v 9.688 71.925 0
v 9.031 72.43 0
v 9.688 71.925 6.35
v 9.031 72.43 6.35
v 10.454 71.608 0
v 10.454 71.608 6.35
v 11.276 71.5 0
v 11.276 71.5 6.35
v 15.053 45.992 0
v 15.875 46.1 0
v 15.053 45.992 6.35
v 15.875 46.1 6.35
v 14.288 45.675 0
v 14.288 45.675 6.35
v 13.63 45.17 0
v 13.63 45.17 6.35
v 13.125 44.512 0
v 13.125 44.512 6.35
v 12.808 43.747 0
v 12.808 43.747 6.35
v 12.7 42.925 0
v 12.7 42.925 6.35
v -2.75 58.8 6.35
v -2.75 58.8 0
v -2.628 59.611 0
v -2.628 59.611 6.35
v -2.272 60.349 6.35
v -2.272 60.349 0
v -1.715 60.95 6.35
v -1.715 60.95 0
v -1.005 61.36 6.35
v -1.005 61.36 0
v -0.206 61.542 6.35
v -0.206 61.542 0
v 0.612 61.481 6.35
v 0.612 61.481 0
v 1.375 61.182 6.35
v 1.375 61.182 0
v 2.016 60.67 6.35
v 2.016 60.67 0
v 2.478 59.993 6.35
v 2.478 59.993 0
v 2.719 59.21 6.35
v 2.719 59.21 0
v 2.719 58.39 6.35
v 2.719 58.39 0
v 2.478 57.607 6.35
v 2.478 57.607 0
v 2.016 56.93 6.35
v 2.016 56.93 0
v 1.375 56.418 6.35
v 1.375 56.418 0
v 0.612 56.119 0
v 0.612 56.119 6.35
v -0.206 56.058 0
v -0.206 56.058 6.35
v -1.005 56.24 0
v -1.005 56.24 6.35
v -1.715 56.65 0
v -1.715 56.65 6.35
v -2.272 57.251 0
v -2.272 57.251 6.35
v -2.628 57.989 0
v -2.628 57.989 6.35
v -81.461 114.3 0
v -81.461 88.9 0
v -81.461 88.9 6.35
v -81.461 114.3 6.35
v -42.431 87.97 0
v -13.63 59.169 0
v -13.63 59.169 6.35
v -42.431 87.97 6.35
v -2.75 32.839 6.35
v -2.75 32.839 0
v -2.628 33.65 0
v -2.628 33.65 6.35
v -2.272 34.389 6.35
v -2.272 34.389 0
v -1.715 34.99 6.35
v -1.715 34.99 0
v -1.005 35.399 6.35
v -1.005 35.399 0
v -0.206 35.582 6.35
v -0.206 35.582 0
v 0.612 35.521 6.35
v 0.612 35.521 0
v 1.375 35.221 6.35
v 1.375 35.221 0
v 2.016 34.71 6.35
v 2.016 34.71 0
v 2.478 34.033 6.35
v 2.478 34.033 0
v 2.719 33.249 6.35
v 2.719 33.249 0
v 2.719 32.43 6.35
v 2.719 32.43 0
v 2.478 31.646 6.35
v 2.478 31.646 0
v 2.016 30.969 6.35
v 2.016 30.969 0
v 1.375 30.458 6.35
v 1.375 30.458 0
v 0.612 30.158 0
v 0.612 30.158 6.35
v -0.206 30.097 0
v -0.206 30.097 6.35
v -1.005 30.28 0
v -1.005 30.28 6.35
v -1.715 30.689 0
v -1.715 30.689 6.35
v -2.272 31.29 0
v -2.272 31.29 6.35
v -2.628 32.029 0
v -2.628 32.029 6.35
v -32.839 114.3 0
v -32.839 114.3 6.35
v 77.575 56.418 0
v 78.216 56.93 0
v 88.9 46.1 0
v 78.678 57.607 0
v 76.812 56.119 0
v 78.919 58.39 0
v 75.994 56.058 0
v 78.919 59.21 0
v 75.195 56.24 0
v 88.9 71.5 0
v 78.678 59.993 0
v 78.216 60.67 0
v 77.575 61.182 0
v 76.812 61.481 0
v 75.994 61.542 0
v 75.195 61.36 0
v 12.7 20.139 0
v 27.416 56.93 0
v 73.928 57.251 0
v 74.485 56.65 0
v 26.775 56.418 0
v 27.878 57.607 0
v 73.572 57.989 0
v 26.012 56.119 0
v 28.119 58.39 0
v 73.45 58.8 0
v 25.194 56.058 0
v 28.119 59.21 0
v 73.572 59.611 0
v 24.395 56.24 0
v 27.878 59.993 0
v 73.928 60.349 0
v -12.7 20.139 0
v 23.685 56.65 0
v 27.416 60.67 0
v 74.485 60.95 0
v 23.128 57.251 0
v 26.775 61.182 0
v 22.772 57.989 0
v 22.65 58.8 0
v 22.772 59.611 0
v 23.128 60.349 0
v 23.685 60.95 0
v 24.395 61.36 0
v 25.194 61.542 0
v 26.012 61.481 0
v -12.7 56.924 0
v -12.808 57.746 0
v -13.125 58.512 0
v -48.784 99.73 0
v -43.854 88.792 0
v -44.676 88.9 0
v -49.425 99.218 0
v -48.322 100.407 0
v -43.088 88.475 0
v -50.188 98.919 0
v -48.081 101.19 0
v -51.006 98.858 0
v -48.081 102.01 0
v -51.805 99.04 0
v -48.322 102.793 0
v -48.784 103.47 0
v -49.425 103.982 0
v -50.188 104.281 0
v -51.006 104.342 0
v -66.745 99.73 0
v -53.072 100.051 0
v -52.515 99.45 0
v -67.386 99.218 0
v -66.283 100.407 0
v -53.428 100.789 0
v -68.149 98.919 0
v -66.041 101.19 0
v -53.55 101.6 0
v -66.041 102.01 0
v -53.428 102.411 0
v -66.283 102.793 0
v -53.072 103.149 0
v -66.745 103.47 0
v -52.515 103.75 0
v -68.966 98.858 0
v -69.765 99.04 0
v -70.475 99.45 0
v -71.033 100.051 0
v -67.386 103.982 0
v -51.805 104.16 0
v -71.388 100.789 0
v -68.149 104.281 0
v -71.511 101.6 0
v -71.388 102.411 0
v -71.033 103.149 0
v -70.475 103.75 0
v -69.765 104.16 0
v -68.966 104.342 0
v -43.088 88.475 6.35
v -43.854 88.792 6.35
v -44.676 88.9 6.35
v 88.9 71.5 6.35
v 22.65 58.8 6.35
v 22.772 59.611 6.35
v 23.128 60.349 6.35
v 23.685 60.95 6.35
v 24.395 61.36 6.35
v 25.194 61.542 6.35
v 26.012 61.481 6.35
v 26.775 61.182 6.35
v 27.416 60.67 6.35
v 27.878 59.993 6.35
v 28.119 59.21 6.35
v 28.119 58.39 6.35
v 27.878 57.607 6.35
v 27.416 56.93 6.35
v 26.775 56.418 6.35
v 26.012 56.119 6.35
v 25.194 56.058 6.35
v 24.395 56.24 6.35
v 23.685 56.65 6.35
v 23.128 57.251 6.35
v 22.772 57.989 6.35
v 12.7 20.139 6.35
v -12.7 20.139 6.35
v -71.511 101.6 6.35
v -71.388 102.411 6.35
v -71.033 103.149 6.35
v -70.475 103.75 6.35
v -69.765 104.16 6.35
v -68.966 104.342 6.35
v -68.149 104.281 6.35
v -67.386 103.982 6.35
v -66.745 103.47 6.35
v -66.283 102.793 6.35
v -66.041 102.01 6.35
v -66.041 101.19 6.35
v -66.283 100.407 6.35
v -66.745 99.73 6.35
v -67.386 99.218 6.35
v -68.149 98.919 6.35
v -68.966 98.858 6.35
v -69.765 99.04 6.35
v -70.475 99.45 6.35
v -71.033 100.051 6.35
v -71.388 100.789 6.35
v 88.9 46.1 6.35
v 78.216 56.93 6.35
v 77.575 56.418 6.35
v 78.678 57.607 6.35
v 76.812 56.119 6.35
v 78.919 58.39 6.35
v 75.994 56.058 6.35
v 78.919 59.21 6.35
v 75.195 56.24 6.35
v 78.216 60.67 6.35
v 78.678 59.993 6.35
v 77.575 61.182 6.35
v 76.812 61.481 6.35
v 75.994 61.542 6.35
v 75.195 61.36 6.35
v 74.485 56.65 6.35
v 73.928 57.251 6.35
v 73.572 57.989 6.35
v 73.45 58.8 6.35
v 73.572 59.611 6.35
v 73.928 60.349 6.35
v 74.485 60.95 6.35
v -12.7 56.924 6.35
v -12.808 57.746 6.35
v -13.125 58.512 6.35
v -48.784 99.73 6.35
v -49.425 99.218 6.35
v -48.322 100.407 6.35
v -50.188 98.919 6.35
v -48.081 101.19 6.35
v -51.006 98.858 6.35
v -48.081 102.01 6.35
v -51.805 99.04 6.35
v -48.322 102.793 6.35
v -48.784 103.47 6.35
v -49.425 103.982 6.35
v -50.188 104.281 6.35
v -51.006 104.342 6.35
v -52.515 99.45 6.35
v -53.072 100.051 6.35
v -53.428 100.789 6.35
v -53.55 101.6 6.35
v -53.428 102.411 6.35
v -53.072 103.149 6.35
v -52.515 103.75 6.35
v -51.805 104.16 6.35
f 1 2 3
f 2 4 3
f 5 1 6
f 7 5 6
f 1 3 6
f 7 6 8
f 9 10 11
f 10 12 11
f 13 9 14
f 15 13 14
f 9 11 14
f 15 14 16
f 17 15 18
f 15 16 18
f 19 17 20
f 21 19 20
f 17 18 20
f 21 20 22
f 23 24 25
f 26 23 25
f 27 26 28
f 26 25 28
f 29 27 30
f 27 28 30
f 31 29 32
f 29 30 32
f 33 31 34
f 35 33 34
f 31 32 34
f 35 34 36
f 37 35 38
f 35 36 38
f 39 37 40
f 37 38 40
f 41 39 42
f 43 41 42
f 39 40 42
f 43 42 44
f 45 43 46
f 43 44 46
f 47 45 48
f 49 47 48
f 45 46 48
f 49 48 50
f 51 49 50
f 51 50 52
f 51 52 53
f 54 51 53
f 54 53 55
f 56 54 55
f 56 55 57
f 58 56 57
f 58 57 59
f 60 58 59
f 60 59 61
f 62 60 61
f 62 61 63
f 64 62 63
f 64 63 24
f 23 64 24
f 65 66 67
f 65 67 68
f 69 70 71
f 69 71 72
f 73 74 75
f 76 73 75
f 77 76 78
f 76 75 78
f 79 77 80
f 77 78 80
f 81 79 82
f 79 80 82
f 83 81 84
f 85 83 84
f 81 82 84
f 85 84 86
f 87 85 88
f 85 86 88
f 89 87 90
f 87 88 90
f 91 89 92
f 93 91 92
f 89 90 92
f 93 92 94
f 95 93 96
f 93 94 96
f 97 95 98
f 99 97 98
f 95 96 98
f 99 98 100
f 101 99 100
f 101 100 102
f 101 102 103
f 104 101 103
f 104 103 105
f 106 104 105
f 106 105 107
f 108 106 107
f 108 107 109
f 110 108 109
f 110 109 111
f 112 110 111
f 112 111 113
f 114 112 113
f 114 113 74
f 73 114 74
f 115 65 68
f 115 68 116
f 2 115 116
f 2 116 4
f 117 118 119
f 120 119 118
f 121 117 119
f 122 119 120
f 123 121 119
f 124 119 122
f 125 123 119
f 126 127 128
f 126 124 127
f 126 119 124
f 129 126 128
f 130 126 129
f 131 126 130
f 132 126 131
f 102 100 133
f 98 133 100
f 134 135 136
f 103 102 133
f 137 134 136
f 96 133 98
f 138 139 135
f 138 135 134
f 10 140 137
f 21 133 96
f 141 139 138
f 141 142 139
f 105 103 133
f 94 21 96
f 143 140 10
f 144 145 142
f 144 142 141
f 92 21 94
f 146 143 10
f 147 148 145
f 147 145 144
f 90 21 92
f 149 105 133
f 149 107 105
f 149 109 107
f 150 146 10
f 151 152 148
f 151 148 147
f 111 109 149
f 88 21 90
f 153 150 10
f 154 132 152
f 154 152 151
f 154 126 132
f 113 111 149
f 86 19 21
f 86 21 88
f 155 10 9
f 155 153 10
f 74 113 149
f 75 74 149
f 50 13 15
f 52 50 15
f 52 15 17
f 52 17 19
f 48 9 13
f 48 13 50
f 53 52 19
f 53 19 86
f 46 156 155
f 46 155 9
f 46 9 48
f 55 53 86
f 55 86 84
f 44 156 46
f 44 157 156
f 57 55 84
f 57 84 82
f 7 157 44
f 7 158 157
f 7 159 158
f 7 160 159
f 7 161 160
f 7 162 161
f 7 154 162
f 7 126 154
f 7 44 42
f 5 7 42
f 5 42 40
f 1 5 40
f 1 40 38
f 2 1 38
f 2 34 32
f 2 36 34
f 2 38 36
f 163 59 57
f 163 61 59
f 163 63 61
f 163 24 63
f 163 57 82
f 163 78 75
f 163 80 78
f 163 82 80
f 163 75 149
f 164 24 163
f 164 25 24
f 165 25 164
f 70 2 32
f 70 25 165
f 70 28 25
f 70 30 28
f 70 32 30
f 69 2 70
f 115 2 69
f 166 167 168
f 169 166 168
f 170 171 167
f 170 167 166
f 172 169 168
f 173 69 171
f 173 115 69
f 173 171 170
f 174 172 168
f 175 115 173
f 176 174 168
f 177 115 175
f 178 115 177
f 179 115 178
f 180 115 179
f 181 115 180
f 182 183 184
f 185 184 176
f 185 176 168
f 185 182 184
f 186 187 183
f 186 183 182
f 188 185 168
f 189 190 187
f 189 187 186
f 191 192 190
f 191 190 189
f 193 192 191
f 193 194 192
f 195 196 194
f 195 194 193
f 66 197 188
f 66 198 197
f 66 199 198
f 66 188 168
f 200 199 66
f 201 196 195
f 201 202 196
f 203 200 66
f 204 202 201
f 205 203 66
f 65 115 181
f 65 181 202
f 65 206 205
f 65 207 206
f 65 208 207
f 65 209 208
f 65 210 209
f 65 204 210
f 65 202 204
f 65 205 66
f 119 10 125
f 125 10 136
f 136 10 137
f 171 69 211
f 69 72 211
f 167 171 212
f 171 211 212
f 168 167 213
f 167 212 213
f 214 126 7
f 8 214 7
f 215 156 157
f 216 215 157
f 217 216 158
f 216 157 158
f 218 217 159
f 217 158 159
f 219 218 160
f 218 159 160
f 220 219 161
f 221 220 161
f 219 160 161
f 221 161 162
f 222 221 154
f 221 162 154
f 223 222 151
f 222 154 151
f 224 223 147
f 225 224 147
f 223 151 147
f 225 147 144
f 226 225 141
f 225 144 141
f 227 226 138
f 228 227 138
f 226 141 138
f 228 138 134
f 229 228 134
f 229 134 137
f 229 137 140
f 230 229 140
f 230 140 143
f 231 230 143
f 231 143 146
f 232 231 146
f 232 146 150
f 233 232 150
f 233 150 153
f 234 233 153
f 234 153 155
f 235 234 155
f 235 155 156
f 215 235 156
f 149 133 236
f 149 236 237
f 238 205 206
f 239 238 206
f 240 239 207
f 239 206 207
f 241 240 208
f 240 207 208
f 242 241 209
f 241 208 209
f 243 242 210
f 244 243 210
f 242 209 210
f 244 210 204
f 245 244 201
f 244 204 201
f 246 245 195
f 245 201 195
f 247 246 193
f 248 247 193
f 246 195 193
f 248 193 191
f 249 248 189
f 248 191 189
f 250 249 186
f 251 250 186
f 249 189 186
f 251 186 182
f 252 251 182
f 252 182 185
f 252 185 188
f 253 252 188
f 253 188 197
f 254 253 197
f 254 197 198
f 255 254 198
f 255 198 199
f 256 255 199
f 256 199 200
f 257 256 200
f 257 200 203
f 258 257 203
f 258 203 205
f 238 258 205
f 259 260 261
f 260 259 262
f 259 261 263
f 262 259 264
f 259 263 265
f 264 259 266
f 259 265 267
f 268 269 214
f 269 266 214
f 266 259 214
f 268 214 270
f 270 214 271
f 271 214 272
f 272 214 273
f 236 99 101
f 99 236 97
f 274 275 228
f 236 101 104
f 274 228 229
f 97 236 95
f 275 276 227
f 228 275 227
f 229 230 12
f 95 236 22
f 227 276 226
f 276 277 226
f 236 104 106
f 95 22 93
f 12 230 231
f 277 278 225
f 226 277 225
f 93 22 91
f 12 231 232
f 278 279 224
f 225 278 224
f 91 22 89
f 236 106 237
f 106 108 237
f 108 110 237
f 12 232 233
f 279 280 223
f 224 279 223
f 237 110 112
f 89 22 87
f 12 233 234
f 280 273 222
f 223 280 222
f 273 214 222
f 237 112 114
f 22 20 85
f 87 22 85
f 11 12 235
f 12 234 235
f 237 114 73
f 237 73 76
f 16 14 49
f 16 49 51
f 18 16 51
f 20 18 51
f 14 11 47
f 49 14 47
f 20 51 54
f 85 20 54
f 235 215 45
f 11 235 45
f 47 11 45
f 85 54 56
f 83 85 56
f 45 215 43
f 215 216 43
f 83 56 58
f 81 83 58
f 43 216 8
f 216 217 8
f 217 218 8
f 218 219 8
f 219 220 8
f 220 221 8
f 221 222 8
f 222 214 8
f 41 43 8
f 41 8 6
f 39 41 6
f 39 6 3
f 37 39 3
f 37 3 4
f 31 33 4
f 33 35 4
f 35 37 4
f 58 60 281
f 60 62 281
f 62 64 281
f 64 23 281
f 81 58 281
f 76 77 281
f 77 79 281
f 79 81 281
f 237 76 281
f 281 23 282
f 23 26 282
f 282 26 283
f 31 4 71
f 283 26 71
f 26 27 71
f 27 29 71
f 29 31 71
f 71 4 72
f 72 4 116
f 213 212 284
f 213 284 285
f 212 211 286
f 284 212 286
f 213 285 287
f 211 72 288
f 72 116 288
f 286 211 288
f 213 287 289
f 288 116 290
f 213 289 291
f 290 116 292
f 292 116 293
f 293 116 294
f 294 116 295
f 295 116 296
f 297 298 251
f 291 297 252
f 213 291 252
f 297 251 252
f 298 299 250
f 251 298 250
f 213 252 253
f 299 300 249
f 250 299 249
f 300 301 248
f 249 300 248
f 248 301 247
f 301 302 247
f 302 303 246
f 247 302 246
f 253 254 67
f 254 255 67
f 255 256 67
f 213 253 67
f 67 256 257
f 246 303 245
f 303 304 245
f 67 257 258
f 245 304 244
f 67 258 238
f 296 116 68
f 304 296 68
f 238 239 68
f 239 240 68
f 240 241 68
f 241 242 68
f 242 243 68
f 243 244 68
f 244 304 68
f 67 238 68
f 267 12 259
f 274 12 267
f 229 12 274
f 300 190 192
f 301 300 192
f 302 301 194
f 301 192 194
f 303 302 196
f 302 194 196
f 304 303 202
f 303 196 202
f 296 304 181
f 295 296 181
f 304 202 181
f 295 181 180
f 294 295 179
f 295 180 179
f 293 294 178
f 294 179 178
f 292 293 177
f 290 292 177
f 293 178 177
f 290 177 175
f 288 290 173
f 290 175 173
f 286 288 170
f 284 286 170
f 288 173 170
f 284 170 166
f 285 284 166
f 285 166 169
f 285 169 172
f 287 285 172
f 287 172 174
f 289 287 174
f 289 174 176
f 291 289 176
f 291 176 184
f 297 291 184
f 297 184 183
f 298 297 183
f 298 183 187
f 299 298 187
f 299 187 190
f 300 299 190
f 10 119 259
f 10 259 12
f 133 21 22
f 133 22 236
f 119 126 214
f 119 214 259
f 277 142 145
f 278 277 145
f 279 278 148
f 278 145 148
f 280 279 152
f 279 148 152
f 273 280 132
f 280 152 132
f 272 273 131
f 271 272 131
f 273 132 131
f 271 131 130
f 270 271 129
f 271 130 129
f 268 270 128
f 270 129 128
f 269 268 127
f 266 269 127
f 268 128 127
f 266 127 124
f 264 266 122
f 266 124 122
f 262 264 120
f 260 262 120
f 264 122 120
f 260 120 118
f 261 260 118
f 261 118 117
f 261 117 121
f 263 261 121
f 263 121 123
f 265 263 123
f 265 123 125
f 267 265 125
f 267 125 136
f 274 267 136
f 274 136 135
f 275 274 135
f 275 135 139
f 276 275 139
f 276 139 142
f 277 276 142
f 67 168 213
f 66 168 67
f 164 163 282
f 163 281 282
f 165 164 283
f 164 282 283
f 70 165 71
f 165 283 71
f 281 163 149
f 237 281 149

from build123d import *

# Parameters (mm, degrees)
BOSS_EXTRUDE1_DEPTH      = 6.35
FILLET1_R                = 3.175
M5_CLEARANCE_HOLE1_D     = 5.5
M5_CLEARANCE_HOLE1_DEPTH = 18.75
M5_CLEARANCE_HOLE1_TIP   = 1.652366702


with BuildPart() as part:
    # Sketch1 → Boss-Extrude1 (new body)
    with BuildSketch(Plane.XY):
        Polygon((-12.7, 46.1), (-12.7, 58.239487758), (-43.360512242, 88.9), (-81.460512242, 88.9), (-81.460512242, 114.3), (-32.839487758, 114.3), (9.960512242, 71.5), (12.7, 71.5), (88.9, 71.5), (88.9, 46.1), (12.7, 46.1), (12.7, 20.139487758), (-12.7, 20.139487758), align=None)
    extrude(amount=BOSS_EXTRUDE1_DEPTH)

    # Fillet1
    fillet1_edges = [part.edges().sort_by_distance(p)[0] for p in [
        (-12.7, 58.239487758, 3.175),
        (-43.360512242, 88.9, 3.175),
        (9.960512242, 71.5, 3.175),
        (12.7, 46.1, 3.175),
    ]]
    fillet(fillet1_edges, radius=FILLET1_R)

    # M5 Clearance Hole1
    with Locations(Plane.XY.offset(6.35)):
        with Locations((0, 58.8), (25.4, 58.8), (76.2, 58.8), (-50.8, 101.6), (-68.760512242, 101.6), (0, 32.839487758)):
            Hole(M5_CLEARANCE_HOLE1_D / 2, depth=M5_CLEARANCE_HOLE1_DEPTH)
            with Locations((0, 0, -(M5_CLEARANCE_HOLE1_DEPTH + M5_CLEARANCE_HOLE1_TIP / 2))):  # 118° drill point
                Cone(0, M5_CLEARANCE_HOLE1_D / 2, M5_CLEARANCE_HOLE1_TIP, mode=Mode.SUBTRACT)


solid = part.part
